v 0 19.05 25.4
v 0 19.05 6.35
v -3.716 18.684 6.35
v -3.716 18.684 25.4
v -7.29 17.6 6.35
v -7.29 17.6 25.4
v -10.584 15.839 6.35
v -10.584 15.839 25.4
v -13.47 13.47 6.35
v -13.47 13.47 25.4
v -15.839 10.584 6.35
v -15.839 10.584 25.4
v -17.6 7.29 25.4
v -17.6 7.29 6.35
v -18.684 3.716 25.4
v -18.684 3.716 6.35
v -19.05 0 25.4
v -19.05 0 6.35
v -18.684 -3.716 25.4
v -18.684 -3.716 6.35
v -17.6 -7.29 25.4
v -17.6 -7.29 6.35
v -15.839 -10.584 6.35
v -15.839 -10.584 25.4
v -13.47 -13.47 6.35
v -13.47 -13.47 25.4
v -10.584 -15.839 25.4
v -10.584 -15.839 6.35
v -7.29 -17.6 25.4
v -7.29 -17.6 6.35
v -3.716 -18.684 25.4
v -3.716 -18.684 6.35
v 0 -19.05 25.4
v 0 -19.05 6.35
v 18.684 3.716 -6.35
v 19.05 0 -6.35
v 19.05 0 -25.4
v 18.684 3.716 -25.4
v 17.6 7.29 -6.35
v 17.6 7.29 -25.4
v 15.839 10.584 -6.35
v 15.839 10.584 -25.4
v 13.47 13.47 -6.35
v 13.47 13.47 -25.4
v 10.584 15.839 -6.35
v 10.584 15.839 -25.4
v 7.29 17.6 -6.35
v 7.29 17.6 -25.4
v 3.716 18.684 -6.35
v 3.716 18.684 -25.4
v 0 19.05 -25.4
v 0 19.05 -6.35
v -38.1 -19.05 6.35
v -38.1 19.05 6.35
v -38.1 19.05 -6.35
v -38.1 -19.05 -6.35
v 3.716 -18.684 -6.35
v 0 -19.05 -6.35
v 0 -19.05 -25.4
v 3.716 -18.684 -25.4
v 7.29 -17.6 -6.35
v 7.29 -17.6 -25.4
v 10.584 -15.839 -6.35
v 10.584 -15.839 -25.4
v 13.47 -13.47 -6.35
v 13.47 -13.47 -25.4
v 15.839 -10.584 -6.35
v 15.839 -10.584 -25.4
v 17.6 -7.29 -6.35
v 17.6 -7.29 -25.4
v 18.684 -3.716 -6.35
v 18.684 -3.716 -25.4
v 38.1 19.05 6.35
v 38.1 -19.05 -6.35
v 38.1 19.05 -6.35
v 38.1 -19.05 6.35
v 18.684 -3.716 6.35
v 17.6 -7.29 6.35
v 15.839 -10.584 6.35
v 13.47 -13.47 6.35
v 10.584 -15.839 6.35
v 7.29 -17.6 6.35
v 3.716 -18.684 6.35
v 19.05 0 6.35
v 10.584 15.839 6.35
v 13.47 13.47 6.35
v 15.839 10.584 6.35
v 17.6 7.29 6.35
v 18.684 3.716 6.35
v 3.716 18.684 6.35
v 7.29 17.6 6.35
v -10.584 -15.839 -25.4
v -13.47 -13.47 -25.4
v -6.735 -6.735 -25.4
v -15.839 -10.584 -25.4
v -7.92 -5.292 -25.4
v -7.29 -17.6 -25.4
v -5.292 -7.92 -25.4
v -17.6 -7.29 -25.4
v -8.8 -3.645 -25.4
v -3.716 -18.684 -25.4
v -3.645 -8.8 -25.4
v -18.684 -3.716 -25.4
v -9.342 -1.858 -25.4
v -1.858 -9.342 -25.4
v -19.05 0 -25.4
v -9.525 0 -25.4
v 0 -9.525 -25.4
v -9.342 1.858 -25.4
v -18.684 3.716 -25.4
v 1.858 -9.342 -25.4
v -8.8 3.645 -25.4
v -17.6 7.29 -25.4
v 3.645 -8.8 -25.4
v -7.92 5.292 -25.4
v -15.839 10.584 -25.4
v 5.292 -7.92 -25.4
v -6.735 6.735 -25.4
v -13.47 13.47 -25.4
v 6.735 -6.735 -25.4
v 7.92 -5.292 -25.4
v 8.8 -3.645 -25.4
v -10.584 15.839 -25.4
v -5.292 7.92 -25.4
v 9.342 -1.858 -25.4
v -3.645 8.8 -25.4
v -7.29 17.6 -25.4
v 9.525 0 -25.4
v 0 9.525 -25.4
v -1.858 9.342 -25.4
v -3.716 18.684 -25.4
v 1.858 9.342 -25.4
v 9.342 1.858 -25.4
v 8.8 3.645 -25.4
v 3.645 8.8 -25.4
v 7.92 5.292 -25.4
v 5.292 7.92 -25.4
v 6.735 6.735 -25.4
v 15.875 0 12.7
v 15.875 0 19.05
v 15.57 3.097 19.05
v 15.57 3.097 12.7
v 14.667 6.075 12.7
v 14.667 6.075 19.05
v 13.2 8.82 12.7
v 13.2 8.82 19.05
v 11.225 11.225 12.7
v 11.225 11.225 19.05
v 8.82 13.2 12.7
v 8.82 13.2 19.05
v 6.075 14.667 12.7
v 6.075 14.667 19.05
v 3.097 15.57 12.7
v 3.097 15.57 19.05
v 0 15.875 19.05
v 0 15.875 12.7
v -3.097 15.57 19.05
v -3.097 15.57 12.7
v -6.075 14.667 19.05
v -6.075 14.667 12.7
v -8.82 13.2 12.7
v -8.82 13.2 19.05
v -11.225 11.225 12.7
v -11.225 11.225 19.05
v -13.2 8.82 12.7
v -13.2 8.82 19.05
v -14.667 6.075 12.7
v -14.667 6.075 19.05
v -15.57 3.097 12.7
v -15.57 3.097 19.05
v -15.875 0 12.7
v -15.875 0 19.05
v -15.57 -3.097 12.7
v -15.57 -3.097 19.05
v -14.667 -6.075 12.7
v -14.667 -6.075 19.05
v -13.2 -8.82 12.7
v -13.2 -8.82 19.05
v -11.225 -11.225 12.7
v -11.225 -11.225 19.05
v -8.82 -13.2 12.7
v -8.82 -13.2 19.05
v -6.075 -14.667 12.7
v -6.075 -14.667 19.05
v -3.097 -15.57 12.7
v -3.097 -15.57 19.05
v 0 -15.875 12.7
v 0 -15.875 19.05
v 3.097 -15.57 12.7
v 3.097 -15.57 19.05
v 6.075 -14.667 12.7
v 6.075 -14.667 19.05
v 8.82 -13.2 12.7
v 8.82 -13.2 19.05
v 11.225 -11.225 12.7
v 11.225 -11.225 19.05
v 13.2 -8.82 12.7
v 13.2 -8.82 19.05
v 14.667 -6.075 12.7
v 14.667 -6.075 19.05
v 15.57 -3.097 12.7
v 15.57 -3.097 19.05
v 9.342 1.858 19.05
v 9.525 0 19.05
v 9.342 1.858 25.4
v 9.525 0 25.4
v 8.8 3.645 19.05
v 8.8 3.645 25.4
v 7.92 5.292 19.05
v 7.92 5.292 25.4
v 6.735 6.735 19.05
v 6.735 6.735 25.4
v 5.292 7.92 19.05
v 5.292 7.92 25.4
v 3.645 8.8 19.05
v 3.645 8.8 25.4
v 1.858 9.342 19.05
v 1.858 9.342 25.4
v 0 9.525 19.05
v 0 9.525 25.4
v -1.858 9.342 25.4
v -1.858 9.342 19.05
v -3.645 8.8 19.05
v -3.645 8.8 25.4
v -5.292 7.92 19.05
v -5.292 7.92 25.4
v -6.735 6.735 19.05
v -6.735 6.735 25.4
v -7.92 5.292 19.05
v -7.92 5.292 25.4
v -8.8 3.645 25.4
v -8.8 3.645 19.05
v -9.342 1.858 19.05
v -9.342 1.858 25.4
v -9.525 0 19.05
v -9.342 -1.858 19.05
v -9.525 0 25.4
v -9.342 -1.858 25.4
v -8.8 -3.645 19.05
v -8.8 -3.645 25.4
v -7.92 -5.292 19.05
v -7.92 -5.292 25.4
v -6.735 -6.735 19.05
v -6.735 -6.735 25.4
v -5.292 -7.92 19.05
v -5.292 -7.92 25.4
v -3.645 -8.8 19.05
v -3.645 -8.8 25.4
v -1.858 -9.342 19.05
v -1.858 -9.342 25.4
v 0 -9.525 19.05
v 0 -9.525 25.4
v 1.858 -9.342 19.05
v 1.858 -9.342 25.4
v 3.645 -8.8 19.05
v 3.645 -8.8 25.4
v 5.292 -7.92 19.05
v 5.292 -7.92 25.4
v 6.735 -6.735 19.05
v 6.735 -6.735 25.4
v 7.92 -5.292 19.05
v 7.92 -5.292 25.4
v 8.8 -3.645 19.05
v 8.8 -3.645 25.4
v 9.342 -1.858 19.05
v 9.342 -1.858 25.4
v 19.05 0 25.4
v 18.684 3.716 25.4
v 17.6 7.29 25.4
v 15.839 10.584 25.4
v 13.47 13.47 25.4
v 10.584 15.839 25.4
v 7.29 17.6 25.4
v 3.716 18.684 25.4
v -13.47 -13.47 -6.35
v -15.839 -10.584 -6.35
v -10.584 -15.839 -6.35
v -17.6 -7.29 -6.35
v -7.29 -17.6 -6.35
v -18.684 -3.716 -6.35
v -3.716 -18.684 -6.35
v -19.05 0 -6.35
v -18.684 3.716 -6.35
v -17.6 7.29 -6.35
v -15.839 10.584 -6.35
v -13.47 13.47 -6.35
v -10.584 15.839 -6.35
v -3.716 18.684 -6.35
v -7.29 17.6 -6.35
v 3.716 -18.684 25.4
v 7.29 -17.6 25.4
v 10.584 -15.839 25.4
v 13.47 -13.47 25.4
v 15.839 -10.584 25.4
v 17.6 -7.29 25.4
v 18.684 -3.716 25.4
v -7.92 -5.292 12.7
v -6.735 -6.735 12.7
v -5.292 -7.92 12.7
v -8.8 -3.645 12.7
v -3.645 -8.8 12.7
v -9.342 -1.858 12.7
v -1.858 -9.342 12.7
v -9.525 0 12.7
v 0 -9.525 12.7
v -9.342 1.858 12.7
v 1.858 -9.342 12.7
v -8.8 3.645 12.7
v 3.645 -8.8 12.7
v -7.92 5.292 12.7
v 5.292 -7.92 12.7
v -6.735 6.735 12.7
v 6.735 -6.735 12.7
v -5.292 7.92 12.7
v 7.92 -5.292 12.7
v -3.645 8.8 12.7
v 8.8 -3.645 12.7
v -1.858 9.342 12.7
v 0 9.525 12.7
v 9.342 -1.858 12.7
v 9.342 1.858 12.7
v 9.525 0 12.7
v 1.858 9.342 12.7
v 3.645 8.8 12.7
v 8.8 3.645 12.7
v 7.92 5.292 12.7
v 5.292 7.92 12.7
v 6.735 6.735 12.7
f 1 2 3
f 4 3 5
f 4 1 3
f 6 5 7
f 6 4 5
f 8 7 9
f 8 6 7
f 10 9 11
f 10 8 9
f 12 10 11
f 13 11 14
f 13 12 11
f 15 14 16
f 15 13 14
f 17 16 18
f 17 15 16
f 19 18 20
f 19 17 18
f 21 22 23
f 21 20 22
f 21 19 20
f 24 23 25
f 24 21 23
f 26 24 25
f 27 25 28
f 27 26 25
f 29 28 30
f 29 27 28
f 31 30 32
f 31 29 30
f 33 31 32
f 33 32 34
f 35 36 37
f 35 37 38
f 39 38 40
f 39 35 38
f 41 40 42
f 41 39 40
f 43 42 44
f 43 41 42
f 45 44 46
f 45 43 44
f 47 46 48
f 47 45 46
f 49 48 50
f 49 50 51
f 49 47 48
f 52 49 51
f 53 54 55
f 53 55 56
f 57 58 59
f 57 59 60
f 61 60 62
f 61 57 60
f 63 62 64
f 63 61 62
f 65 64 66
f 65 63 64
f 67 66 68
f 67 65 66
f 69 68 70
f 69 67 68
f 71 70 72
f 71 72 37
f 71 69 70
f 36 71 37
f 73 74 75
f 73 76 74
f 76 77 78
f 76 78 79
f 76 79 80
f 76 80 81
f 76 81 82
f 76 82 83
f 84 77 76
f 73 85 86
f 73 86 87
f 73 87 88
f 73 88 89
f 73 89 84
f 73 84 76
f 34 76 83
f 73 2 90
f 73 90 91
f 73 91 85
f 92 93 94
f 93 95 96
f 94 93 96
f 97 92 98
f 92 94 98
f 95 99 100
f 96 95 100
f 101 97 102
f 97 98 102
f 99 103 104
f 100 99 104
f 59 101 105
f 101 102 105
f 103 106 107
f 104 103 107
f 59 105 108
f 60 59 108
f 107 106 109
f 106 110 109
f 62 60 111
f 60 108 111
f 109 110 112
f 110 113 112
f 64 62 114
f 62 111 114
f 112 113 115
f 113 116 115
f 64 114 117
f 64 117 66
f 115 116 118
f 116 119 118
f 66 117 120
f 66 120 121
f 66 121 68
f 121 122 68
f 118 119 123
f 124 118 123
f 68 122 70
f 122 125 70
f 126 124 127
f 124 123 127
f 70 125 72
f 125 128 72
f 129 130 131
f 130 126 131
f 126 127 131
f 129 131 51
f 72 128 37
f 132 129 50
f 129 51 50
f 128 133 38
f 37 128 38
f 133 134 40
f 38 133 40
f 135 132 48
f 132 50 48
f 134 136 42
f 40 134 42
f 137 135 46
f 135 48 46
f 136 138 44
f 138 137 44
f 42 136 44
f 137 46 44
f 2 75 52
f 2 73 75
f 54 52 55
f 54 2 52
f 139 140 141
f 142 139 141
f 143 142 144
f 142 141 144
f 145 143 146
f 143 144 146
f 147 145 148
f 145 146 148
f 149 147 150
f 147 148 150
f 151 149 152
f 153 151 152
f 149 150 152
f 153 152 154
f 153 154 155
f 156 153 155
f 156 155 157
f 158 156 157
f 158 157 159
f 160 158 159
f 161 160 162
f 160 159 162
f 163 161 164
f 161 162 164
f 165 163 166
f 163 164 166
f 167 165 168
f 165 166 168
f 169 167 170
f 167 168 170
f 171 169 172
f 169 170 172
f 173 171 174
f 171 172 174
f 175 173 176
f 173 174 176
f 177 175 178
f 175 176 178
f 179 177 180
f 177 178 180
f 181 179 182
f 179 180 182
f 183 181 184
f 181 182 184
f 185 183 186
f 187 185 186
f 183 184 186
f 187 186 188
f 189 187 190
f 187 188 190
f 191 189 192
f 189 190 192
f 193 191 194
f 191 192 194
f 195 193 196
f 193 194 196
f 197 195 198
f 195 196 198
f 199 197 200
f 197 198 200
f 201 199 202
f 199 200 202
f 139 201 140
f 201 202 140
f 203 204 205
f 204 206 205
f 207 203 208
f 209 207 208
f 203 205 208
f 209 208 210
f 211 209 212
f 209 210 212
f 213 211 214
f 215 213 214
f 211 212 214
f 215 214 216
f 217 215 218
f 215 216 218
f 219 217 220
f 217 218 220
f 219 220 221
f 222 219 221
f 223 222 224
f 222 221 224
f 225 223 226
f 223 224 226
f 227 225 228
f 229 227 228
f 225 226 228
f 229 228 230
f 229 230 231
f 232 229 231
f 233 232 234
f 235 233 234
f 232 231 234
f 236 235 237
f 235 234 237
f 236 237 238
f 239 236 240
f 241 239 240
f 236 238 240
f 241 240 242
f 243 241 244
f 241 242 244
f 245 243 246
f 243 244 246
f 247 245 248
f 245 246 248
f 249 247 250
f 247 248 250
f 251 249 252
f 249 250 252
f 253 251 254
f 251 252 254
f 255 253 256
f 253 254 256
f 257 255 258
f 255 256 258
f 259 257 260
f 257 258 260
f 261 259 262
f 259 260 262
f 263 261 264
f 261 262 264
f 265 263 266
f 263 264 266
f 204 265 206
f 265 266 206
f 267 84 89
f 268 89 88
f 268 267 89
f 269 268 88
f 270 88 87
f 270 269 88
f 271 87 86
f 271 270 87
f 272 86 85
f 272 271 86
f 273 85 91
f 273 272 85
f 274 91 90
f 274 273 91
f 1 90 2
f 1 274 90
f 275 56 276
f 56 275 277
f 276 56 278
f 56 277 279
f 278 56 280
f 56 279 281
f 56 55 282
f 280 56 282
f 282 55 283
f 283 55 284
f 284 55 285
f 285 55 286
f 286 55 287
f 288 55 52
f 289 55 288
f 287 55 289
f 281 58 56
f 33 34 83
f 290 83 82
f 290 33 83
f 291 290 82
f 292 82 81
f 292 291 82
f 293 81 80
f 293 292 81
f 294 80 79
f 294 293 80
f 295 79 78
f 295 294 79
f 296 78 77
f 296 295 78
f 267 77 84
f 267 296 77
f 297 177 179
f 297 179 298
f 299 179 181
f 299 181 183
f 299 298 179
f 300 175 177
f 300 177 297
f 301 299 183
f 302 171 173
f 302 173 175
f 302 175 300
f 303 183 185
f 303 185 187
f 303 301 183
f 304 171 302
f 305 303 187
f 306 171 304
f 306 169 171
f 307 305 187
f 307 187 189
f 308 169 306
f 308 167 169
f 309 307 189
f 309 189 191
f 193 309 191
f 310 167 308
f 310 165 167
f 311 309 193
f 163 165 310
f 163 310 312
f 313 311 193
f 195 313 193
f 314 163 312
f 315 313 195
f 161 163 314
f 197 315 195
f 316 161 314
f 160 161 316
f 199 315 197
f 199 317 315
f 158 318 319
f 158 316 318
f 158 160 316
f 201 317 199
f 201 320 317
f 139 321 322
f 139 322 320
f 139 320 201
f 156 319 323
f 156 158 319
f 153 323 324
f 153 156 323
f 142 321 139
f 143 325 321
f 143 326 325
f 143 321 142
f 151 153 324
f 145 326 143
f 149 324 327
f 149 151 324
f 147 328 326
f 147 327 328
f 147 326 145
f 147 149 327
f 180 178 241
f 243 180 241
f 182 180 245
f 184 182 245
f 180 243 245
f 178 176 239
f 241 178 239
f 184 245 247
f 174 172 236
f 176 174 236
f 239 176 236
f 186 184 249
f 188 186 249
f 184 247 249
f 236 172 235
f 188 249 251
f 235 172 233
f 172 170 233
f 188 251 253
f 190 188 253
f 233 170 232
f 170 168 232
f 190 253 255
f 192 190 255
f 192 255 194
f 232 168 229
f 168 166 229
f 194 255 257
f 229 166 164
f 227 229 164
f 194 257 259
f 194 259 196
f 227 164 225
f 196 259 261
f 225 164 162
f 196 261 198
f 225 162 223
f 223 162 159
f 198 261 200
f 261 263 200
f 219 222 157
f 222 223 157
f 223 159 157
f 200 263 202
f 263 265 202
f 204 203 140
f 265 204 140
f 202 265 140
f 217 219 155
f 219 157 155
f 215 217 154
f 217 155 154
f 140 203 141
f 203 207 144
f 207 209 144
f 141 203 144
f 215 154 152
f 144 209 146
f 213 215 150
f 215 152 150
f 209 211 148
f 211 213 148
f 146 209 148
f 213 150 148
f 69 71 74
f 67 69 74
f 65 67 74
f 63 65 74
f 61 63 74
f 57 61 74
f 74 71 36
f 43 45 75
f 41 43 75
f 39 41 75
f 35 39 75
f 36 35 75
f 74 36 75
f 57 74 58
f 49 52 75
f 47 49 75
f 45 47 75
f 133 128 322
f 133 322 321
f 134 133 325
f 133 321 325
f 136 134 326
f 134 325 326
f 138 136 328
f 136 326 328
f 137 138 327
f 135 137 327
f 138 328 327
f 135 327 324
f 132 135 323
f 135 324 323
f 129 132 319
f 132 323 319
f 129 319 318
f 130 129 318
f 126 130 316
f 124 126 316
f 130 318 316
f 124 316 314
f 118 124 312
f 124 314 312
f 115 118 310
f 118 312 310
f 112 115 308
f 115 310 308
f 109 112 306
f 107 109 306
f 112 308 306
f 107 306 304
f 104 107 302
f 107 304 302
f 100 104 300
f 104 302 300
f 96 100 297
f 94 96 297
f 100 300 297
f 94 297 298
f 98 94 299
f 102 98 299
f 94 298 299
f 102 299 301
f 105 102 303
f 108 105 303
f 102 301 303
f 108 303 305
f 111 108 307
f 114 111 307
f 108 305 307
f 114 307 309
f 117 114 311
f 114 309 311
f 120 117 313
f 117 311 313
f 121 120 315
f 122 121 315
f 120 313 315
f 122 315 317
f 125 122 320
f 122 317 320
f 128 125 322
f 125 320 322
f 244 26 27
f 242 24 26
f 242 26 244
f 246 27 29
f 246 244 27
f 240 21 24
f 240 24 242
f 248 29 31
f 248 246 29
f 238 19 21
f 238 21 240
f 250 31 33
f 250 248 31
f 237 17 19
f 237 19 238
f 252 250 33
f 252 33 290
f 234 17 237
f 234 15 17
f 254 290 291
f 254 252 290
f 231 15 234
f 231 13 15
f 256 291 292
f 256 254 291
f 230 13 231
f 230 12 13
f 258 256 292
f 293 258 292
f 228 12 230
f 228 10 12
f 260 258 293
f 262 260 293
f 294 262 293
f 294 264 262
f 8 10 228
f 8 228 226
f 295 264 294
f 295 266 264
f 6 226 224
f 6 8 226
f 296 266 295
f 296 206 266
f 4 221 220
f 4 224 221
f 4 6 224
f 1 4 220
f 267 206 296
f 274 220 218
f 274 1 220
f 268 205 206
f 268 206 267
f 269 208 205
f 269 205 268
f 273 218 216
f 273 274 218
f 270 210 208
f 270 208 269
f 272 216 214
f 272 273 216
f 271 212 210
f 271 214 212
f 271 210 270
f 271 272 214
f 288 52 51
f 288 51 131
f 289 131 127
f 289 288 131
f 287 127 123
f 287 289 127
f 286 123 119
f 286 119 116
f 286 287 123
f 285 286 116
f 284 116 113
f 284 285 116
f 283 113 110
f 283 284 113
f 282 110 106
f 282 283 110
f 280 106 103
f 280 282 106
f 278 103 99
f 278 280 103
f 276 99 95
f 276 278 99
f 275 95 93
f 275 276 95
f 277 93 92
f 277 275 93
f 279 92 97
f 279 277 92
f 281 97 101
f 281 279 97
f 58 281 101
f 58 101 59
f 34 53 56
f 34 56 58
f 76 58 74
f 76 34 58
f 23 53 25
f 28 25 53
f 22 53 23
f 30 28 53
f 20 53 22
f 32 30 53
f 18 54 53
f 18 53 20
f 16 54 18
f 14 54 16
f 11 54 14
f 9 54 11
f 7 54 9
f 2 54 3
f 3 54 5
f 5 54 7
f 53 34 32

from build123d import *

# Parameters (mm, degrees)
F1_DEPTH = 25.4
F2_R     = 9.525
F3_DEPTH = 6.35
F4_R     = 15.875
F5_DEPTH = 6.35
F6_R     = 9.525
F7_DEPTH = 76.2
F8_DEPTH = 6.35


with BuildPart() as f1:
    # F0 (on Top) → F1 (new body, symmetric)
    with BuildSketch(Plane.XY):
        with BuildLine():
            ThreePointArc((0, -19.05), (13.470384, -13.470384), (19.05, 0))
            ThreePointArc((19.05, 0), (13.470384, 13.470384), (0, 19.05))
            ThreePointArc((0, 19.05), (-19.05, 0), (0, -19.05))
        make_face()
    extrude(amount=F1_DEPTH, both=True)

    # F2 (on face) → F3 (cut)
    with BuildSketch(Plane.XY.offset(12.7)):
        Circle(F2_R)
    extrude(amount=-F3_DEPTH, mode=Mode.SUBTRACT)

    # F4 (on face) → F5 (cut)
    with BuildSketch(Plane.XY.offset(19.05)):
        Circle(F4_R)
    extrude(amount=-F5_DEPTH, mode=Mode.SUBTRACT)

    # F6 (on face) → F7 (cut)
    with BuildSketch(Plane.XY.offset(25.4)):
        Circle(F6_R)
    extrude(amount=-F7_DEPTH, mode=Mode.SUBTRACT)

    # F0 (on Top) → F8 (join, symmetric)
    with BuildSketch(Plane.XY):
        with BuildLine():
            ThreePointArc((0, -19.05), (-19.05, 0), (0, 19.05))
            Line((0, 19.05), (-38.1, 19.05))
            Line((-38.1, 19.05), (-38.1, -19.05))
            Line((-38.1, -19.05), (0, -19.05))
        make_face()
        with BuildLine():
            ThreePointArc((0, 19.05), (13.470384, 13.470384), (19.05, 0))
            ThreePointArc((19.05, 0), (13.470384, -13.470384), (0, -19.05))
            Line((0, -19.05), (38.1, -19.05))
            Line((38.1, -19.05), (38.1, 19.05))
            Line((38.1, 19.05), (0, 19.05))
        make_face()
    extrude(amount=F8_DEPTH, both=True)


solid = f1.part
